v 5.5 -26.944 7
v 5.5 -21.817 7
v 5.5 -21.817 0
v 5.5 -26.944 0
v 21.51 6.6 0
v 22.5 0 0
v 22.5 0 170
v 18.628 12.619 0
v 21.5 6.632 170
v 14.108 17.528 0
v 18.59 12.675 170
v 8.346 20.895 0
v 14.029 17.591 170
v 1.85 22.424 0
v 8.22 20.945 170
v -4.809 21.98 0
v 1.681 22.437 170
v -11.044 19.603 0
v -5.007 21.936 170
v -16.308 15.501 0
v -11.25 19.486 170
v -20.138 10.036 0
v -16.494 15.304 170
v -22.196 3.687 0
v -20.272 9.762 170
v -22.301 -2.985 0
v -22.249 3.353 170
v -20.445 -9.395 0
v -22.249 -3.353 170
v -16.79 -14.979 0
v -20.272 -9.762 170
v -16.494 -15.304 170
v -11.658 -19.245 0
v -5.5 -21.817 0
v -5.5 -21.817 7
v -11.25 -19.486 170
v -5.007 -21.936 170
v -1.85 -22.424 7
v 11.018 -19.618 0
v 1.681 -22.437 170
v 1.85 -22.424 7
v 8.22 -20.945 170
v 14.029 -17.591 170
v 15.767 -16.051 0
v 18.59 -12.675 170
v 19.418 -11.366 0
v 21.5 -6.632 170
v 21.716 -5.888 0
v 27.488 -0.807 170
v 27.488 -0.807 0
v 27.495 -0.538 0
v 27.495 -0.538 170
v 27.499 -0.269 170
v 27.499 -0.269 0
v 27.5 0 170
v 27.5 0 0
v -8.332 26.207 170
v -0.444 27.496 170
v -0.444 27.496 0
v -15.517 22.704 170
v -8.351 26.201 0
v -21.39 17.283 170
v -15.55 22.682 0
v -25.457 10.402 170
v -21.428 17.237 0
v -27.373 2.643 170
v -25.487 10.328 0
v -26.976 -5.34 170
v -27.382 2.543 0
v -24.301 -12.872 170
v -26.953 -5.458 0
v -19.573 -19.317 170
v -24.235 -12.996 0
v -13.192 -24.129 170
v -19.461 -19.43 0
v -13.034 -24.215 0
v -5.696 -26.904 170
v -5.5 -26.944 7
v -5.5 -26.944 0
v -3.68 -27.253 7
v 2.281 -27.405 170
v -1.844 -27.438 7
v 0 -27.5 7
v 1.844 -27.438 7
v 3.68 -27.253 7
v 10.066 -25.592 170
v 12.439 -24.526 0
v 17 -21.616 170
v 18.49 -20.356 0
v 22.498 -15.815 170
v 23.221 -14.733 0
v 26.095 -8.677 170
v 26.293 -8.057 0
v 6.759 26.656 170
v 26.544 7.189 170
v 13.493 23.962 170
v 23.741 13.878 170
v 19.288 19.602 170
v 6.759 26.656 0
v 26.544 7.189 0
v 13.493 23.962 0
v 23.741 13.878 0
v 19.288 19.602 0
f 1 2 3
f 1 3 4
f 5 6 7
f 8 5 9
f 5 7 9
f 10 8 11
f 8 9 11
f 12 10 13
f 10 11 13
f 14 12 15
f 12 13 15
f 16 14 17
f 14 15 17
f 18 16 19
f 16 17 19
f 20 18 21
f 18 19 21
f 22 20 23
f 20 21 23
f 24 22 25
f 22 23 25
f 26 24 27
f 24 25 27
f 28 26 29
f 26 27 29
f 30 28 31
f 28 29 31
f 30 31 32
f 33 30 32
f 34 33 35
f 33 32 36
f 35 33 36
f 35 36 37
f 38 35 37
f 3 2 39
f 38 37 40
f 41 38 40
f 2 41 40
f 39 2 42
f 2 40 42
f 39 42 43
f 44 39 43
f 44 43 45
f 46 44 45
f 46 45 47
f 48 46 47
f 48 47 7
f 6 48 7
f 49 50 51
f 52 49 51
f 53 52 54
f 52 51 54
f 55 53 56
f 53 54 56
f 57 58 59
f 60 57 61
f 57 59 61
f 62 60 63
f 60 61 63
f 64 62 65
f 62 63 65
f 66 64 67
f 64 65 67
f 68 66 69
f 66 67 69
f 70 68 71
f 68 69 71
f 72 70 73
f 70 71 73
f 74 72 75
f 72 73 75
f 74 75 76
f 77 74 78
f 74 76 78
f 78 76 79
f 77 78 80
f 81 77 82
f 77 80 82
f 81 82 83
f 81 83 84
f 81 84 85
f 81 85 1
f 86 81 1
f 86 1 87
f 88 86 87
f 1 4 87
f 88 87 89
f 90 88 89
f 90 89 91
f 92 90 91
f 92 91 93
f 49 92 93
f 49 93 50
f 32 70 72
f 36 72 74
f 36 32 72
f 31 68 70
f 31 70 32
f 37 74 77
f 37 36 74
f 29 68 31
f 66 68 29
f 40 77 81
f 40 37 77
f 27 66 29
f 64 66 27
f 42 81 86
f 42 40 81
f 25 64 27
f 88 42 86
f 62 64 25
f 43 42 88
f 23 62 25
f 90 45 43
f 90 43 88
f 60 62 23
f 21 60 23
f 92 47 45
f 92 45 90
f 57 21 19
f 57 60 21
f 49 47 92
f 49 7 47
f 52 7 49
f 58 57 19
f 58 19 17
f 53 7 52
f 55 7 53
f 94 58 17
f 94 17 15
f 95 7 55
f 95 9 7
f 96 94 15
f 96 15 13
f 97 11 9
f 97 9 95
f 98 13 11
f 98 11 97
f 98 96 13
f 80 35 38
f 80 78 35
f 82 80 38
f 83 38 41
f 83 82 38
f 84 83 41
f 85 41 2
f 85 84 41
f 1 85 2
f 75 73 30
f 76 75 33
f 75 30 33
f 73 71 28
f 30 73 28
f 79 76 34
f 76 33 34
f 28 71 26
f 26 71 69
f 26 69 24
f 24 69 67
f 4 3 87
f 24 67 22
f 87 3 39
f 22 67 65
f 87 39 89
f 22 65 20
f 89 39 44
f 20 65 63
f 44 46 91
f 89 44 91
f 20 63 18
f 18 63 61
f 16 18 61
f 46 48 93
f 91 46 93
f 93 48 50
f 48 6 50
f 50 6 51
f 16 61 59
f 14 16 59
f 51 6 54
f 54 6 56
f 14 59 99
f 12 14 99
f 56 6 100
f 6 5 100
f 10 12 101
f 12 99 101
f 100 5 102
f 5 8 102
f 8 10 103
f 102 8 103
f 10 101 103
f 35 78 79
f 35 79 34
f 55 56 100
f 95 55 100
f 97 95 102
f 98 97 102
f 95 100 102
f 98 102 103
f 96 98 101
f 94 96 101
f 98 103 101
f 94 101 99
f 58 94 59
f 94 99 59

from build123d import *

# Parameters (mm, degrees)
F2_DEPTH = 170
F3_R     = 22.5
F4_DEPTH = 170
F6_DEPTH = 7


with BuildPart() as f2:
    # F1 (on face) → F2 (new body)
    with BuildSketch(Plane.XY):
        with BuildLine():
            ThreePointArc((27.4881675578, -0.8066252621), (27.4970417303, -0.4033560215), (27.5, 0))
            ThreePointArc((27.5, 0), (19.2877918034, 19.6018133689), (-0.4440790799, 27.4964141984))
            Line((-0.4440790799, 27.4964141984), (-0.4440790799, -0.5180921289))
            Line((-0.4440790799, -0.5180921289), (27.4881675578, -0.8066252621))
        make_face()
        with BuildLine():
            Line((-0.4440790799, -0.5180921289), (-0.4440790799, 27.4964141984))
            ThreePointArc((-0.4440790799, 27.4964141984), (-19.5732263839, -19.3168012084), (27.4881675578, -0.8066252621))
            Line((27.4881675578, -0.8066252621), (-0.4440790799, -0.5180921289))
        make_face()
    extrude(amount=F2_DEPTH)

    # F3 (on face) → F4 (cut)
    with BuildSketch(Plane.XY.offset(170)):
        Circle(F3_R)
    extrude(amount=-F4_DEPTH, mode=Mode.SUBTRACT)

    # F5 (on face) → F6 (cut)
    with BuildSketch(Plane(origin=(0, 0, 0), x_dir=(1, 0, 0), z_dir=(0, 0, -1))):
        with BuildLine():
            ThreePointArc((-5.5, 21.8174242293), (0, 22.5), (5.5, 21.8174242293))
            Line((5.5, 21.8174242293), (5.5, 26.9443871706))
            ThreePointArc((5.5, 26.9443871706), (2.7639964551, 27.3607442076), (0, 27.5))
            ThreePointArc((0, 27.5), (-2.7639964551, 27.3607442076), (-5.5, 26.9443871706))
            Line((-5.5, 26.9443871706), (-5.5, 21.8174242293))
        make_face()
    extrude(amount=-F6_DEPTH, mode=Mode.SUBTRACT)


solid = f2.part
